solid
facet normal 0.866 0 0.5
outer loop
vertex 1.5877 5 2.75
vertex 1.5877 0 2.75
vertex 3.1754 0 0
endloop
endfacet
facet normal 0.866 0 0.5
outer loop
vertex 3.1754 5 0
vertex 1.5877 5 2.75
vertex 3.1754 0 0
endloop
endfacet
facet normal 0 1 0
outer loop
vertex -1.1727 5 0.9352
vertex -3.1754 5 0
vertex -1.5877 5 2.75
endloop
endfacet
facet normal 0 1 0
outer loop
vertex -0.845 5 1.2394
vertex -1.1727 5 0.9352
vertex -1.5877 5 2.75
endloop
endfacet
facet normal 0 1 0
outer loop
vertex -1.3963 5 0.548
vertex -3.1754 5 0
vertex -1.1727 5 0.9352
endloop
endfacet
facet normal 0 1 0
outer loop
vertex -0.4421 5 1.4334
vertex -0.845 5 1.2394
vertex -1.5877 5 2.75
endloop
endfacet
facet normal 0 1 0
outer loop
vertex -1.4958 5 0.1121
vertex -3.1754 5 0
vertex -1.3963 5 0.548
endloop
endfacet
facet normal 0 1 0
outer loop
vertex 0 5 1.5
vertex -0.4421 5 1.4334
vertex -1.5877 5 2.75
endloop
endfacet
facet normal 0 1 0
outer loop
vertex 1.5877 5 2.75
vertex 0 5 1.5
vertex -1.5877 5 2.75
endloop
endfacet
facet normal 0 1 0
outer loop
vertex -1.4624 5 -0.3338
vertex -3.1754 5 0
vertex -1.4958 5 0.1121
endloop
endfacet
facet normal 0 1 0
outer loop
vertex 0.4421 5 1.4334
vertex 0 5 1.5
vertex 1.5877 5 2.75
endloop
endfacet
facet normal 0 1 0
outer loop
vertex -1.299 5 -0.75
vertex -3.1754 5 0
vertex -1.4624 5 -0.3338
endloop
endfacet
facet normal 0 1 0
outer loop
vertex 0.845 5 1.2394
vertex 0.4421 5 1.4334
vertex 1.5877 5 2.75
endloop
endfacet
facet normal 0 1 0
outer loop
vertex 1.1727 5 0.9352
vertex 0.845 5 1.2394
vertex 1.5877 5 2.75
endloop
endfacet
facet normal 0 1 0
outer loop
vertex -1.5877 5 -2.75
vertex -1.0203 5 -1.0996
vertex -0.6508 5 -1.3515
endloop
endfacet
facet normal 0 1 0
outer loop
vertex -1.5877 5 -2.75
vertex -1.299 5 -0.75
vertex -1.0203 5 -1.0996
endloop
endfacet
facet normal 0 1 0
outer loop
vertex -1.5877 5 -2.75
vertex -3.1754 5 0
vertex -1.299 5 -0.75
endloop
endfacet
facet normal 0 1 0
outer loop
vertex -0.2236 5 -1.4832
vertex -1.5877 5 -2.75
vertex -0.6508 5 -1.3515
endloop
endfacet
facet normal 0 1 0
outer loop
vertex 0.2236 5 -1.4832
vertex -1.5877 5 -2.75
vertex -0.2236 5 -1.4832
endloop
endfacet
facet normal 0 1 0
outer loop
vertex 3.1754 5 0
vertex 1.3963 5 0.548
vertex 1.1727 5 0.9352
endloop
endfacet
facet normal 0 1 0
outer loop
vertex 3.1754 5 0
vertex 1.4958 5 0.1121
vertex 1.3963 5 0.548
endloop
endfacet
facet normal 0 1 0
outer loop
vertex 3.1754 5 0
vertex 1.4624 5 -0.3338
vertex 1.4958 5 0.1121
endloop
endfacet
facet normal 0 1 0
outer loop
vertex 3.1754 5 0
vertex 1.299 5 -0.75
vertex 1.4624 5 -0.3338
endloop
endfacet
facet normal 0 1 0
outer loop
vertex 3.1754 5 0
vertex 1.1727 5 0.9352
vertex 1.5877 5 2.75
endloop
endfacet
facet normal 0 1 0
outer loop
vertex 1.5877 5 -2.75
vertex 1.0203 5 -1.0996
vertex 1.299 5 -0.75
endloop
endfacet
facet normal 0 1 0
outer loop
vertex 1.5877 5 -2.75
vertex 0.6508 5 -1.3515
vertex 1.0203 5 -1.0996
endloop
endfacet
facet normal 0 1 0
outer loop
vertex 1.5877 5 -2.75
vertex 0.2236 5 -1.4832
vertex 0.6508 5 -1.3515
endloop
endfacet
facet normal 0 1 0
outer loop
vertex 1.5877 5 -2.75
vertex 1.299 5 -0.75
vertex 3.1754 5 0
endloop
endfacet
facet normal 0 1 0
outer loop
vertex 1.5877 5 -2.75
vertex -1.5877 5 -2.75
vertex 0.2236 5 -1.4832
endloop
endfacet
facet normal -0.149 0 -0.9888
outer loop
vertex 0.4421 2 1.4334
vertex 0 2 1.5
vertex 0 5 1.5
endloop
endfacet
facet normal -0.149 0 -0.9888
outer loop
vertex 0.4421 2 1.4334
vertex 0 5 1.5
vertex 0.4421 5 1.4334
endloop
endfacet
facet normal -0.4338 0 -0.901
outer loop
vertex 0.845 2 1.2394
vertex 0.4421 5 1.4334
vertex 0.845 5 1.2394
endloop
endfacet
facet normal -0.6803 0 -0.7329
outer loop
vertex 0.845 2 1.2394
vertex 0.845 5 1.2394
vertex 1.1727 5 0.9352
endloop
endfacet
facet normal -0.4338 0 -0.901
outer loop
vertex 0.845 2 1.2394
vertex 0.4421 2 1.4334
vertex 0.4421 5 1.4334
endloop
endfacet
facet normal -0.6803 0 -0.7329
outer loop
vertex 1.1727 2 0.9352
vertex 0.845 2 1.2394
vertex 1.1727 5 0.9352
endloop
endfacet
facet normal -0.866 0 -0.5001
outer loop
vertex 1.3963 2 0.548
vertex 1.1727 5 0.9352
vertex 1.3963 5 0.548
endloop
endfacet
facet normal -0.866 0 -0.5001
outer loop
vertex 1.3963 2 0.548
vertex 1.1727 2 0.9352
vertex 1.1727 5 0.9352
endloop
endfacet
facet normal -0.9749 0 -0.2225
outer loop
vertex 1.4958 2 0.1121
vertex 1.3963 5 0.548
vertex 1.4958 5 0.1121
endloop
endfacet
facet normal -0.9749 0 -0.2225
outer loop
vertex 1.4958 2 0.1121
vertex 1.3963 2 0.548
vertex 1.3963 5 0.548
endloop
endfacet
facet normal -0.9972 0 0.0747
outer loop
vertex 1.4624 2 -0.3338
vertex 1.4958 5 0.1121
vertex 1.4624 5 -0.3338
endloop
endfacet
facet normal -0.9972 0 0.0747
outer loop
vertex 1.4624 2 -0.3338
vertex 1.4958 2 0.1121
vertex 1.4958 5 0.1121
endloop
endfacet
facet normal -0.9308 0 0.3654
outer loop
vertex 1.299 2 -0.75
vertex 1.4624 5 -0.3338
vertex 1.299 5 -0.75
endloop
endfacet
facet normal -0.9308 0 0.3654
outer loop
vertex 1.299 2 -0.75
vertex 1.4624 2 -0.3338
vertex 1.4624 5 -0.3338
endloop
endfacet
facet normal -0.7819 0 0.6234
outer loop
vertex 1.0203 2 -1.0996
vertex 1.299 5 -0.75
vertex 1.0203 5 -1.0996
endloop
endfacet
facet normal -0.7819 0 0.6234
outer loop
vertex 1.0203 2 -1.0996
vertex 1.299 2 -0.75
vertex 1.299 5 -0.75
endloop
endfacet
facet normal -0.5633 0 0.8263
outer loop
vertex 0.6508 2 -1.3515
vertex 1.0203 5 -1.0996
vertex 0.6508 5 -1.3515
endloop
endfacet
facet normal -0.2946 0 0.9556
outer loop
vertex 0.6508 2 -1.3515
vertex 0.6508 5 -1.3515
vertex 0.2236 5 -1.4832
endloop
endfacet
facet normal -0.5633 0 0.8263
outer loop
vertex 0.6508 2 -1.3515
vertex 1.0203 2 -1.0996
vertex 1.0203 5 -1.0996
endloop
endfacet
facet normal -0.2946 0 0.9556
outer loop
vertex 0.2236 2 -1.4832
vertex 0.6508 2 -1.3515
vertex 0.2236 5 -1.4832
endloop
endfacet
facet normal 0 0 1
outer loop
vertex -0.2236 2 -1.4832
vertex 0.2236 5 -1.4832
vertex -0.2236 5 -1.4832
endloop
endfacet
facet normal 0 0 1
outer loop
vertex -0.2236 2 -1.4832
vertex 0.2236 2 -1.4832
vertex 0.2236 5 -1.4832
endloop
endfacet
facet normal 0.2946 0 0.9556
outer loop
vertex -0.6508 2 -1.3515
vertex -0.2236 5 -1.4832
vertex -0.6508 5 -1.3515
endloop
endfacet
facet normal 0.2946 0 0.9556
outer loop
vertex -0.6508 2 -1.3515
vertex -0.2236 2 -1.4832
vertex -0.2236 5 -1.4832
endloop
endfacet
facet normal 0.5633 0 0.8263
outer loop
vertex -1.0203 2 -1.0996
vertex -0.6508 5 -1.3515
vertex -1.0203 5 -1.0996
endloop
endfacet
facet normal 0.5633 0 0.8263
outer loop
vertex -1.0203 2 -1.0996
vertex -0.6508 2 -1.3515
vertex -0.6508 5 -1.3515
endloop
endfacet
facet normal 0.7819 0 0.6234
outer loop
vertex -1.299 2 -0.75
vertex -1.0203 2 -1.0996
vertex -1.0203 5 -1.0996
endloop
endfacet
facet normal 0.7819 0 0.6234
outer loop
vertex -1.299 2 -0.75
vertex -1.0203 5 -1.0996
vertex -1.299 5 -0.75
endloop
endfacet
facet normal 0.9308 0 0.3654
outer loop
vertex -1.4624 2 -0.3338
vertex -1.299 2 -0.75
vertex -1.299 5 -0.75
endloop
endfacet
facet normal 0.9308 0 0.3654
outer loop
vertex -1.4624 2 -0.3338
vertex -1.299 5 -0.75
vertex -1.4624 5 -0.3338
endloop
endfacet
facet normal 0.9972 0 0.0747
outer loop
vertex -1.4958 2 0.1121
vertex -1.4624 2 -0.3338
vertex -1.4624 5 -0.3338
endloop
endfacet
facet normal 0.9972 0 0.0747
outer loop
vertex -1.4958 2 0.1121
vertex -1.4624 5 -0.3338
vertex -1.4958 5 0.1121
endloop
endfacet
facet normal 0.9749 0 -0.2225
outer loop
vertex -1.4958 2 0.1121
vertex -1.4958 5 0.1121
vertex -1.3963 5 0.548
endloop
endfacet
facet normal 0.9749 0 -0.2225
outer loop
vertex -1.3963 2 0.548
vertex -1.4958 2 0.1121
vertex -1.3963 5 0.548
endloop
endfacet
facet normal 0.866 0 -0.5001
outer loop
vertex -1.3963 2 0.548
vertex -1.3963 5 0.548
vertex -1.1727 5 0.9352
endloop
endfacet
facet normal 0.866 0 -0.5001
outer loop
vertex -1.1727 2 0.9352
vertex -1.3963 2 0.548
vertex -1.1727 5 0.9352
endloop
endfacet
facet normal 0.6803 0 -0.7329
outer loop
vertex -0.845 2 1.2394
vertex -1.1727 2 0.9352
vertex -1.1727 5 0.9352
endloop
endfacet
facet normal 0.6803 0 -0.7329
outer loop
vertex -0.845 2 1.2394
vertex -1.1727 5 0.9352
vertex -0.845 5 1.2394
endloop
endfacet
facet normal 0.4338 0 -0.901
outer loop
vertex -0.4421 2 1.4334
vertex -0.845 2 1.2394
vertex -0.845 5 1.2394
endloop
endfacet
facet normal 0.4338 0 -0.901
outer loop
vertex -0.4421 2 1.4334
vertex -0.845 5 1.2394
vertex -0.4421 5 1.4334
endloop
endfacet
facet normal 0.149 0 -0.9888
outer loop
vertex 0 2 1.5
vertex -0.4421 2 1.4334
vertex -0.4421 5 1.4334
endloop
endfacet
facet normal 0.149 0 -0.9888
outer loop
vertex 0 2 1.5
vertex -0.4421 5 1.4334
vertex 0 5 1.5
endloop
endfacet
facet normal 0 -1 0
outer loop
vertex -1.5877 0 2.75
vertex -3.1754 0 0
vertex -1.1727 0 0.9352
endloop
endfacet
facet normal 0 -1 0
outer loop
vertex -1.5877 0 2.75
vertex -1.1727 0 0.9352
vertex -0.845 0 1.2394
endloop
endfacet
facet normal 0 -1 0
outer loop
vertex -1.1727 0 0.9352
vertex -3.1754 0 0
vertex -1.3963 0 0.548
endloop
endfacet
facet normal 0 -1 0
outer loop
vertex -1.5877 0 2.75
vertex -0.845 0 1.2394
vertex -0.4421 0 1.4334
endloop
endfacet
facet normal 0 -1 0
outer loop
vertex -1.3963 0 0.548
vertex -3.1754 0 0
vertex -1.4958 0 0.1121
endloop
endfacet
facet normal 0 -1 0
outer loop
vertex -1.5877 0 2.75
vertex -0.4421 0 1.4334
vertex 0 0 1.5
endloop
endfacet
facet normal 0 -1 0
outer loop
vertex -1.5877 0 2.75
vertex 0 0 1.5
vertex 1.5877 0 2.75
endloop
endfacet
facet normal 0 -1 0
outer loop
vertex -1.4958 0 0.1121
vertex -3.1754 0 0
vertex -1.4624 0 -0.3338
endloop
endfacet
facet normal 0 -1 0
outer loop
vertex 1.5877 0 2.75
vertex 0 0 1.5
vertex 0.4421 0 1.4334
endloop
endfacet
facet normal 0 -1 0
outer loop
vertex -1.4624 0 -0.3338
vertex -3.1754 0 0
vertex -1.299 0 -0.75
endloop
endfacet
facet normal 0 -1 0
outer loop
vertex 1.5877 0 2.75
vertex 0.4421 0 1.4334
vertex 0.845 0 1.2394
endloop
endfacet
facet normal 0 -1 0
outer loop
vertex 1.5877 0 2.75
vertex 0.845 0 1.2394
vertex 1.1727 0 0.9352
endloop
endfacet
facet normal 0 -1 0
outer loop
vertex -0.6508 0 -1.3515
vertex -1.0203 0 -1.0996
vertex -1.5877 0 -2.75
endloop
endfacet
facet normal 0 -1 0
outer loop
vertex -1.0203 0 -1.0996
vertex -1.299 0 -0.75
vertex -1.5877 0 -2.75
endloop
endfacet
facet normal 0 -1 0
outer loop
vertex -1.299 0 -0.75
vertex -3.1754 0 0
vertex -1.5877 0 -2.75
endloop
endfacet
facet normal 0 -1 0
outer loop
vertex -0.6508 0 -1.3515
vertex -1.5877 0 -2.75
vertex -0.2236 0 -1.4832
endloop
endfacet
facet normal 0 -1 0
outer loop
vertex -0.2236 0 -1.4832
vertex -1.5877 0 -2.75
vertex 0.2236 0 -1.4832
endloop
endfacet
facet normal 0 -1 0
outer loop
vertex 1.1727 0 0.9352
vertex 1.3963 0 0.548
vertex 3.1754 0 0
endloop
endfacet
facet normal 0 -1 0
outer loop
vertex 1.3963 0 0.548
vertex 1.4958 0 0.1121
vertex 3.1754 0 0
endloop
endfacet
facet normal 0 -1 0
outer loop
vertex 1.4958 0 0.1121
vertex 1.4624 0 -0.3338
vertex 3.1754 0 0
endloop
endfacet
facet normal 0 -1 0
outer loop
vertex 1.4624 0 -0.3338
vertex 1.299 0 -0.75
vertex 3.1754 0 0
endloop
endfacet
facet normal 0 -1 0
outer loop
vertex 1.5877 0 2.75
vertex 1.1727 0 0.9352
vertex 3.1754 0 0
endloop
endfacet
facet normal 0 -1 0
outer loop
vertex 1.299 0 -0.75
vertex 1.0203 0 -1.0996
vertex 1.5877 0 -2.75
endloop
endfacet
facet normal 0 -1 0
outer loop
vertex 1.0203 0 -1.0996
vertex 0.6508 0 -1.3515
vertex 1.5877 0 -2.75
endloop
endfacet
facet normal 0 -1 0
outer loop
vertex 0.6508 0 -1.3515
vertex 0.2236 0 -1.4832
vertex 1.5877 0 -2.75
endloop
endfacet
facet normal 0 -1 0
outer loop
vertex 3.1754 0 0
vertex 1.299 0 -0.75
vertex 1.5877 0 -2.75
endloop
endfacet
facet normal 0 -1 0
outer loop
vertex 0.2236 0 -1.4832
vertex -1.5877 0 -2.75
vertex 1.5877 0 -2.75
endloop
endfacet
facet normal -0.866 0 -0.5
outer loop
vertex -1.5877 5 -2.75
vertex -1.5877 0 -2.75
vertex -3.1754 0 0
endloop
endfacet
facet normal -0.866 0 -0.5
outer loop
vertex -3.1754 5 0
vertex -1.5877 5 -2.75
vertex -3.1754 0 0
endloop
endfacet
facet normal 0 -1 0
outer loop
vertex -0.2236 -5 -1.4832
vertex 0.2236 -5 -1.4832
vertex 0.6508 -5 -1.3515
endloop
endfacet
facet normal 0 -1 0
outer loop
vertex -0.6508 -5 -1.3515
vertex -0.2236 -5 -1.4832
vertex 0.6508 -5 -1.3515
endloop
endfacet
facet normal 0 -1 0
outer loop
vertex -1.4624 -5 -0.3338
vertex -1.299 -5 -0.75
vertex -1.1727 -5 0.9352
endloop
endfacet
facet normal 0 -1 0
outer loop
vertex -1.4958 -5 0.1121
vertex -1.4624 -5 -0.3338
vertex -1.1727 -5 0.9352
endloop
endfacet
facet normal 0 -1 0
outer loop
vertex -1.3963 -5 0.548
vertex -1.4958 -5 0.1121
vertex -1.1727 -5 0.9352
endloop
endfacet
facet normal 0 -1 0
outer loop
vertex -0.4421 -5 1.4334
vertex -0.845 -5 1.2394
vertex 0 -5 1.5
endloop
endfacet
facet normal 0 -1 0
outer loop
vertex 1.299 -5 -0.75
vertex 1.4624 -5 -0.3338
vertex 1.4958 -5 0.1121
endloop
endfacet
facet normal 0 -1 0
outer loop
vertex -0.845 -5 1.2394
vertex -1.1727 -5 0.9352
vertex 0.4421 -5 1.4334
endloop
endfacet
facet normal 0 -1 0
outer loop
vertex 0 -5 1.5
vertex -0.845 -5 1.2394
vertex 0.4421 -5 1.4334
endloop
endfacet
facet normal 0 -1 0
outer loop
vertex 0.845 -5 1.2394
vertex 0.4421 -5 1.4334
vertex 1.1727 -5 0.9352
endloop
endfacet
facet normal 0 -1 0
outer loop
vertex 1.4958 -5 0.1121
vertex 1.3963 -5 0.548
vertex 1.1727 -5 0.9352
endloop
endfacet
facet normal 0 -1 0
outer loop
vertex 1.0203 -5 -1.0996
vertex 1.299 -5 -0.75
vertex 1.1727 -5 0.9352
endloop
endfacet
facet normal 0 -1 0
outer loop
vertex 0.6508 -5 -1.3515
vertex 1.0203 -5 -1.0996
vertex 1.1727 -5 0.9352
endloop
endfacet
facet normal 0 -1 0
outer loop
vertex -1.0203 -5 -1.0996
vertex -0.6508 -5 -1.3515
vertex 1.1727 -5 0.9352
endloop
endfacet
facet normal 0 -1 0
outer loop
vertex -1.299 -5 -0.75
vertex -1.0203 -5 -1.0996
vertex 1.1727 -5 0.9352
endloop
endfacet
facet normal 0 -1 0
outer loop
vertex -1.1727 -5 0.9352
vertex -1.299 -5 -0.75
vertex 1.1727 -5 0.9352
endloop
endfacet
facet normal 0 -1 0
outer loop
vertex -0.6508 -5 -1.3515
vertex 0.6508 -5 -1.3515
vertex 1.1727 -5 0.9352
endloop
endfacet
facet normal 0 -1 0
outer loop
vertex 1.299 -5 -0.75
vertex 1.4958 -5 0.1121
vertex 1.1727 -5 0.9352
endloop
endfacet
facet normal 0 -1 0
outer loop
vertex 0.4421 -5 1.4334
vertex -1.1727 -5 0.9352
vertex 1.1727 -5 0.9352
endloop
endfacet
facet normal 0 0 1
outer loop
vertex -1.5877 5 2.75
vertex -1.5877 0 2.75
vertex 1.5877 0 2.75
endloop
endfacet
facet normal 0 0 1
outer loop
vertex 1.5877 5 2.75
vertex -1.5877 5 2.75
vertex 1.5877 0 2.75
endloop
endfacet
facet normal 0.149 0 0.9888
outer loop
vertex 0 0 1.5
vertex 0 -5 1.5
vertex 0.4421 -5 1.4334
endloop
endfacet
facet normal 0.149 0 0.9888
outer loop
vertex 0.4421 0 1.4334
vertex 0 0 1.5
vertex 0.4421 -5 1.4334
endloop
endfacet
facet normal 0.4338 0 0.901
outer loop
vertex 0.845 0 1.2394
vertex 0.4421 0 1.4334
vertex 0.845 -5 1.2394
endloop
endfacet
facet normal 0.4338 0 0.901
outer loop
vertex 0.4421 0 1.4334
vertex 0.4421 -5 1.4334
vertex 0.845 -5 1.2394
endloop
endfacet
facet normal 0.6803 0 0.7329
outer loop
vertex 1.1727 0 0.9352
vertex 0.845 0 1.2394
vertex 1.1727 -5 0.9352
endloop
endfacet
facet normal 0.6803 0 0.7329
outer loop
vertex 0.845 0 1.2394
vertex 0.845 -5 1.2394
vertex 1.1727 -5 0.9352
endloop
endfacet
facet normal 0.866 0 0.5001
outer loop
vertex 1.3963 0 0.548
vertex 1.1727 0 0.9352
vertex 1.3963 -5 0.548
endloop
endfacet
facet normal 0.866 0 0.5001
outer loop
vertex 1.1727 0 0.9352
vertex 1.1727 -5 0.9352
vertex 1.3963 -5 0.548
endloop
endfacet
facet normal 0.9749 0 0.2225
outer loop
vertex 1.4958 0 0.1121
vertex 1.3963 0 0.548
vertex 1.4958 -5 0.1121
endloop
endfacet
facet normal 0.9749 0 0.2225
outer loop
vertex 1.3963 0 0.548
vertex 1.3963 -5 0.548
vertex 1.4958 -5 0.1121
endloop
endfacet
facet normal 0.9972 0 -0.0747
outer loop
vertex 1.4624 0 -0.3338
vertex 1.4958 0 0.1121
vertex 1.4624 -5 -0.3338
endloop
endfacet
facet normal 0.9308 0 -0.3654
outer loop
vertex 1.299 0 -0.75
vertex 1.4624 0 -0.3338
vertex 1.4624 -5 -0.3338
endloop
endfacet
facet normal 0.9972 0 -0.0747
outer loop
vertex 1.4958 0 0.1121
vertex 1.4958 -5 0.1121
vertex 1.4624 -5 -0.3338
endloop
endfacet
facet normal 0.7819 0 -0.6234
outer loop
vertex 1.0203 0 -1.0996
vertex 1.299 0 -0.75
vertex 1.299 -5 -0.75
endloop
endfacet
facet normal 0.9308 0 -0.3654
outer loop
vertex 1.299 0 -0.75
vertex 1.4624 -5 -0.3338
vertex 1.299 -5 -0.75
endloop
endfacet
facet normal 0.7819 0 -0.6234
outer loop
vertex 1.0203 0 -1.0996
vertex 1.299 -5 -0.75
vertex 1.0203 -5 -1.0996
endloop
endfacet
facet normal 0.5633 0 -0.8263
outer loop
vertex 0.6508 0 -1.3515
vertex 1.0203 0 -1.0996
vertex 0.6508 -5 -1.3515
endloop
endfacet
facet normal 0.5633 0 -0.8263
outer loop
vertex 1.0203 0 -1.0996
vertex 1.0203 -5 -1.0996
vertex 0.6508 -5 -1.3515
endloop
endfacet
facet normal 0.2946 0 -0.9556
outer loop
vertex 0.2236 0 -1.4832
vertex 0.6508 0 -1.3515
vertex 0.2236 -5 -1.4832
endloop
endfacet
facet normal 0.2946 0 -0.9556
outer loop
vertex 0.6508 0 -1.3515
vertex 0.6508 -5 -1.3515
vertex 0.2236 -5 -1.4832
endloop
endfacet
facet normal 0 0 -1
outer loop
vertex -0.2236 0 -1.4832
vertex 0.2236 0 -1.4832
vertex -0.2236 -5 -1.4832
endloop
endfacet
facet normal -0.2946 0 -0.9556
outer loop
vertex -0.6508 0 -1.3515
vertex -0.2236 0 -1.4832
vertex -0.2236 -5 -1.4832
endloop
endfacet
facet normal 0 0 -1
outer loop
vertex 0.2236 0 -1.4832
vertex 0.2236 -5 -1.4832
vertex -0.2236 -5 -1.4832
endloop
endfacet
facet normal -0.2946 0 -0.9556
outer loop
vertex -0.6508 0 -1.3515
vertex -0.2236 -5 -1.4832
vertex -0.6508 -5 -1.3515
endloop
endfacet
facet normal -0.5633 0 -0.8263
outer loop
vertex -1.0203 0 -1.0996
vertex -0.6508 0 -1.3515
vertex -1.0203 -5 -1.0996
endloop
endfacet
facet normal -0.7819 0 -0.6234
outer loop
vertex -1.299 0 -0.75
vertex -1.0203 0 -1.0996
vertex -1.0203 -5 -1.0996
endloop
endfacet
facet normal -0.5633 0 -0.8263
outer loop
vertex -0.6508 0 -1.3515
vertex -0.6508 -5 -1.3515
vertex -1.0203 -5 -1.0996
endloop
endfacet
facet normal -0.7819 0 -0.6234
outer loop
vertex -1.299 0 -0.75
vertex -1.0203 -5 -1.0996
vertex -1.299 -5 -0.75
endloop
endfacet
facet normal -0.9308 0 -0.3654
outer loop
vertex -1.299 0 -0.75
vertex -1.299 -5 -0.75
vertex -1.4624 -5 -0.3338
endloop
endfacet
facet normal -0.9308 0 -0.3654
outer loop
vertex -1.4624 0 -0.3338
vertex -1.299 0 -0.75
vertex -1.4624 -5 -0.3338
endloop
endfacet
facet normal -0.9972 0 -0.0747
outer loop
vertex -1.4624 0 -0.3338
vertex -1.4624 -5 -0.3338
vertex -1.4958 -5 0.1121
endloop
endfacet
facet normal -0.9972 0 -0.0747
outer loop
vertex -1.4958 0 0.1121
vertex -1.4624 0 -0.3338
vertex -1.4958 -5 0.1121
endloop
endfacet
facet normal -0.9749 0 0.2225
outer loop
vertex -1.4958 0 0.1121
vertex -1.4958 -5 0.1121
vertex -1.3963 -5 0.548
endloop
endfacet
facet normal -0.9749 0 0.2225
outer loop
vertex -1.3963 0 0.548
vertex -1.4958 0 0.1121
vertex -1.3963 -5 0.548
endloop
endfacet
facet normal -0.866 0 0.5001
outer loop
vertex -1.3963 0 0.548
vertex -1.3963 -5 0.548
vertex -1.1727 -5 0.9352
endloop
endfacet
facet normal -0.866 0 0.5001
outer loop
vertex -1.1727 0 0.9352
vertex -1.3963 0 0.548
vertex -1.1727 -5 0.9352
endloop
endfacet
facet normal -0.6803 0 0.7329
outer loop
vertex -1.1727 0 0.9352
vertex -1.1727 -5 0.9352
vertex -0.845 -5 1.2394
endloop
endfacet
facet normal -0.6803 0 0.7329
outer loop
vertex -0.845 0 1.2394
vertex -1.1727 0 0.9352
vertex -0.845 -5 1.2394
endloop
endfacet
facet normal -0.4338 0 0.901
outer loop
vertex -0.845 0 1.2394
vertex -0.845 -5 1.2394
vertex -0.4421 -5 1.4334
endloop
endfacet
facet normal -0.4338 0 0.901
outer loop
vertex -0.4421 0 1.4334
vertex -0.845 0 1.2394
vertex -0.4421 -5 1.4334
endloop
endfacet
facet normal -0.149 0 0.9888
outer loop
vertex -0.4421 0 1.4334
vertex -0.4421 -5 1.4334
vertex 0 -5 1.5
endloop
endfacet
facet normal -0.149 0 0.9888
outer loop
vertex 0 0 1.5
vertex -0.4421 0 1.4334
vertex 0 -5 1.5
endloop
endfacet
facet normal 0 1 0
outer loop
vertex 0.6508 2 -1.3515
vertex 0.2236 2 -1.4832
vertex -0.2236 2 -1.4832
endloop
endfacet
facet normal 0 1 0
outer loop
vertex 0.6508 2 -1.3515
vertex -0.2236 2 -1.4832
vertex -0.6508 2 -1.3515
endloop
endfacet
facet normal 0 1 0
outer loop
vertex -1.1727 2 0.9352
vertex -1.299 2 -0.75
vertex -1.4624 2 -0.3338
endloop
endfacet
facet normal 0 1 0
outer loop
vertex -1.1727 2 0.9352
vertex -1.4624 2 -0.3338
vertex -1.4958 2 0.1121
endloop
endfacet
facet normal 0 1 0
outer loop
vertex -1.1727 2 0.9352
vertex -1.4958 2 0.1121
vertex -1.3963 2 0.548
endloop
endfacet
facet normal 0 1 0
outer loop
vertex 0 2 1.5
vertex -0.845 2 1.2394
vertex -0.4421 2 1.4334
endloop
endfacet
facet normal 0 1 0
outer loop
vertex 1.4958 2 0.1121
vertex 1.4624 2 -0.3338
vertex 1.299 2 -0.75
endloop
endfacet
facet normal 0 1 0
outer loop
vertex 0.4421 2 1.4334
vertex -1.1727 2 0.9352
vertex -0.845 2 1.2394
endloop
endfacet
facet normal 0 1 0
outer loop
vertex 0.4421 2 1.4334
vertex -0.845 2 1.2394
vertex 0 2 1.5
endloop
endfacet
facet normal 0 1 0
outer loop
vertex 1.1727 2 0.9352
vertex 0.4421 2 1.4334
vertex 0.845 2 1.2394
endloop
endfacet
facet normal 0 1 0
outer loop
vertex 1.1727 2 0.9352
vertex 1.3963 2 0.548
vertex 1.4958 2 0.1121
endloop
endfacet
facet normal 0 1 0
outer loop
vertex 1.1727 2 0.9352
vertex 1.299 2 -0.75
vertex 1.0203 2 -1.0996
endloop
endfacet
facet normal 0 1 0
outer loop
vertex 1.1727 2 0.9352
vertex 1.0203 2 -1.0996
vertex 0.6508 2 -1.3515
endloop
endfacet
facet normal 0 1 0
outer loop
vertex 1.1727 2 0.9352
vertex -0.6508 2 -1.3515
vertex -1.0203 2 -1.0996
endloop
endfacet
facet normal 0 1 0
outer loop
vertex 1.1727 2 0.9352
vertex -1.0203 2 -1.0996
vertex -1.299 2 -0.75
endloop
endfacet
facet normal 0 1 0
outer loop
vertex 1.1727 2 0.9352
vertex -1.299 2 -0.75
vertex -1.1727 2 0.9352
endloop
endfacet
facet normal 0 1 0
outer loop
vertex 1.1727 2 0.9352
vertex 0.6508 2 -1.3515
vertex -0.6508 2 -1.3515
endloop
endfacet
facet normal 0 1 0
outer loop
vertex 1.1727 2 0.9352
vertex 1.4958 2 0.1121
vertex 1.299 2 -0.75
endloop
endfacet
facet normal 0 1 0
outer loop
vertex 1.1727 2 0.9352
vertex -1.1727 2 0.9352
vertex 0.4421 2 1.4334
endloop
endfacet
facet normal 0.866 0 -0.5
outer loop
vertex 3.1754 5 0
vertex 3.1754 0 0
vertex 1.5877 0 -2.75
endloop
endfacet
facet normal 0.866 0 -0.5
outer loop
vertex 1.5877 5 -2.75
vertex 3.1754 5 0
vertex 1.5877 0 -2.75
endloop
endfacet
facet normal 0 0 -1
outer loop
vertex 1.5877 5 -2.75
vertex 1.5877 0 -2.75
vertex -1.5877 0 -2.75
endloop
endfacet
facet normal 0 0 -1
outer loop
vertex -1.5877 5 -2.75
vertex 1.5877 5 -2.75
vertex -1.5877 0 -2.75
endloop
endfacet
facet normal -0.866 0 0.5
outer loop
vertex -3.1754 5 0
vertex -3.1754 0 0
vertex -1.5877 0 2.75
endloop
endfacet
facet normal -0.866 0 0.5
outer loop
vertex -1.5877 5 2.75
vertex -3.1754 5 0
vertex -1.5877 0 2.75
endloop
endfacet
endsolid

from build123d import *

# Parameters (mm, degrees)
IZIM1_R                     = 1.5
Y_KSEKLIK_EKSTR_ZYON1_DEPTH = 5
Y_KSEKLIK_EKSTR_ZYON2_START = -5
IZIM1_2_R                   = 1.5
Y_KSEKLIK_EKSTR_ZYON2_DEPTH = 7


with BuildPart() as part:
    # Çizim1 → Yükseklik-Ekstrüzyon1 (new body)
    with BuildSketch(Plane(origin=(0, 0, 0), x_dir=(1, 0, 0), z_dir=(0, 1, 0))):
        Polygon((1.58771324, -2.75), (3.175426481, 0), (1.58771324, 2.75), (-1.58771324, 2.75), (-3.175426481, 0), (-1.58771324, -2.75), align=None)
        Circle(IZIM1_R, mode=Mode.SUBTRACT)
    extrude(amount=Y_KSEKLIK_EKSTR_ZYON1_DEPTH)

    # Çizim1<2> → Yükseklik-Ekstrüzyon2 (add)
    with BuildSketch(Plane(origin=(0, 0, 0), x_dir=(1, 0, 0), z_dir=(0, 1, 0)).offset(Y_KSEKLIK_EKSTR_ZYON2_START)):
        Circle(IZIM1_2_R)
    extrude(amount=Y_KSEKLIK_EKSTR_ZYON2_DEPTH)


solid = part.part
